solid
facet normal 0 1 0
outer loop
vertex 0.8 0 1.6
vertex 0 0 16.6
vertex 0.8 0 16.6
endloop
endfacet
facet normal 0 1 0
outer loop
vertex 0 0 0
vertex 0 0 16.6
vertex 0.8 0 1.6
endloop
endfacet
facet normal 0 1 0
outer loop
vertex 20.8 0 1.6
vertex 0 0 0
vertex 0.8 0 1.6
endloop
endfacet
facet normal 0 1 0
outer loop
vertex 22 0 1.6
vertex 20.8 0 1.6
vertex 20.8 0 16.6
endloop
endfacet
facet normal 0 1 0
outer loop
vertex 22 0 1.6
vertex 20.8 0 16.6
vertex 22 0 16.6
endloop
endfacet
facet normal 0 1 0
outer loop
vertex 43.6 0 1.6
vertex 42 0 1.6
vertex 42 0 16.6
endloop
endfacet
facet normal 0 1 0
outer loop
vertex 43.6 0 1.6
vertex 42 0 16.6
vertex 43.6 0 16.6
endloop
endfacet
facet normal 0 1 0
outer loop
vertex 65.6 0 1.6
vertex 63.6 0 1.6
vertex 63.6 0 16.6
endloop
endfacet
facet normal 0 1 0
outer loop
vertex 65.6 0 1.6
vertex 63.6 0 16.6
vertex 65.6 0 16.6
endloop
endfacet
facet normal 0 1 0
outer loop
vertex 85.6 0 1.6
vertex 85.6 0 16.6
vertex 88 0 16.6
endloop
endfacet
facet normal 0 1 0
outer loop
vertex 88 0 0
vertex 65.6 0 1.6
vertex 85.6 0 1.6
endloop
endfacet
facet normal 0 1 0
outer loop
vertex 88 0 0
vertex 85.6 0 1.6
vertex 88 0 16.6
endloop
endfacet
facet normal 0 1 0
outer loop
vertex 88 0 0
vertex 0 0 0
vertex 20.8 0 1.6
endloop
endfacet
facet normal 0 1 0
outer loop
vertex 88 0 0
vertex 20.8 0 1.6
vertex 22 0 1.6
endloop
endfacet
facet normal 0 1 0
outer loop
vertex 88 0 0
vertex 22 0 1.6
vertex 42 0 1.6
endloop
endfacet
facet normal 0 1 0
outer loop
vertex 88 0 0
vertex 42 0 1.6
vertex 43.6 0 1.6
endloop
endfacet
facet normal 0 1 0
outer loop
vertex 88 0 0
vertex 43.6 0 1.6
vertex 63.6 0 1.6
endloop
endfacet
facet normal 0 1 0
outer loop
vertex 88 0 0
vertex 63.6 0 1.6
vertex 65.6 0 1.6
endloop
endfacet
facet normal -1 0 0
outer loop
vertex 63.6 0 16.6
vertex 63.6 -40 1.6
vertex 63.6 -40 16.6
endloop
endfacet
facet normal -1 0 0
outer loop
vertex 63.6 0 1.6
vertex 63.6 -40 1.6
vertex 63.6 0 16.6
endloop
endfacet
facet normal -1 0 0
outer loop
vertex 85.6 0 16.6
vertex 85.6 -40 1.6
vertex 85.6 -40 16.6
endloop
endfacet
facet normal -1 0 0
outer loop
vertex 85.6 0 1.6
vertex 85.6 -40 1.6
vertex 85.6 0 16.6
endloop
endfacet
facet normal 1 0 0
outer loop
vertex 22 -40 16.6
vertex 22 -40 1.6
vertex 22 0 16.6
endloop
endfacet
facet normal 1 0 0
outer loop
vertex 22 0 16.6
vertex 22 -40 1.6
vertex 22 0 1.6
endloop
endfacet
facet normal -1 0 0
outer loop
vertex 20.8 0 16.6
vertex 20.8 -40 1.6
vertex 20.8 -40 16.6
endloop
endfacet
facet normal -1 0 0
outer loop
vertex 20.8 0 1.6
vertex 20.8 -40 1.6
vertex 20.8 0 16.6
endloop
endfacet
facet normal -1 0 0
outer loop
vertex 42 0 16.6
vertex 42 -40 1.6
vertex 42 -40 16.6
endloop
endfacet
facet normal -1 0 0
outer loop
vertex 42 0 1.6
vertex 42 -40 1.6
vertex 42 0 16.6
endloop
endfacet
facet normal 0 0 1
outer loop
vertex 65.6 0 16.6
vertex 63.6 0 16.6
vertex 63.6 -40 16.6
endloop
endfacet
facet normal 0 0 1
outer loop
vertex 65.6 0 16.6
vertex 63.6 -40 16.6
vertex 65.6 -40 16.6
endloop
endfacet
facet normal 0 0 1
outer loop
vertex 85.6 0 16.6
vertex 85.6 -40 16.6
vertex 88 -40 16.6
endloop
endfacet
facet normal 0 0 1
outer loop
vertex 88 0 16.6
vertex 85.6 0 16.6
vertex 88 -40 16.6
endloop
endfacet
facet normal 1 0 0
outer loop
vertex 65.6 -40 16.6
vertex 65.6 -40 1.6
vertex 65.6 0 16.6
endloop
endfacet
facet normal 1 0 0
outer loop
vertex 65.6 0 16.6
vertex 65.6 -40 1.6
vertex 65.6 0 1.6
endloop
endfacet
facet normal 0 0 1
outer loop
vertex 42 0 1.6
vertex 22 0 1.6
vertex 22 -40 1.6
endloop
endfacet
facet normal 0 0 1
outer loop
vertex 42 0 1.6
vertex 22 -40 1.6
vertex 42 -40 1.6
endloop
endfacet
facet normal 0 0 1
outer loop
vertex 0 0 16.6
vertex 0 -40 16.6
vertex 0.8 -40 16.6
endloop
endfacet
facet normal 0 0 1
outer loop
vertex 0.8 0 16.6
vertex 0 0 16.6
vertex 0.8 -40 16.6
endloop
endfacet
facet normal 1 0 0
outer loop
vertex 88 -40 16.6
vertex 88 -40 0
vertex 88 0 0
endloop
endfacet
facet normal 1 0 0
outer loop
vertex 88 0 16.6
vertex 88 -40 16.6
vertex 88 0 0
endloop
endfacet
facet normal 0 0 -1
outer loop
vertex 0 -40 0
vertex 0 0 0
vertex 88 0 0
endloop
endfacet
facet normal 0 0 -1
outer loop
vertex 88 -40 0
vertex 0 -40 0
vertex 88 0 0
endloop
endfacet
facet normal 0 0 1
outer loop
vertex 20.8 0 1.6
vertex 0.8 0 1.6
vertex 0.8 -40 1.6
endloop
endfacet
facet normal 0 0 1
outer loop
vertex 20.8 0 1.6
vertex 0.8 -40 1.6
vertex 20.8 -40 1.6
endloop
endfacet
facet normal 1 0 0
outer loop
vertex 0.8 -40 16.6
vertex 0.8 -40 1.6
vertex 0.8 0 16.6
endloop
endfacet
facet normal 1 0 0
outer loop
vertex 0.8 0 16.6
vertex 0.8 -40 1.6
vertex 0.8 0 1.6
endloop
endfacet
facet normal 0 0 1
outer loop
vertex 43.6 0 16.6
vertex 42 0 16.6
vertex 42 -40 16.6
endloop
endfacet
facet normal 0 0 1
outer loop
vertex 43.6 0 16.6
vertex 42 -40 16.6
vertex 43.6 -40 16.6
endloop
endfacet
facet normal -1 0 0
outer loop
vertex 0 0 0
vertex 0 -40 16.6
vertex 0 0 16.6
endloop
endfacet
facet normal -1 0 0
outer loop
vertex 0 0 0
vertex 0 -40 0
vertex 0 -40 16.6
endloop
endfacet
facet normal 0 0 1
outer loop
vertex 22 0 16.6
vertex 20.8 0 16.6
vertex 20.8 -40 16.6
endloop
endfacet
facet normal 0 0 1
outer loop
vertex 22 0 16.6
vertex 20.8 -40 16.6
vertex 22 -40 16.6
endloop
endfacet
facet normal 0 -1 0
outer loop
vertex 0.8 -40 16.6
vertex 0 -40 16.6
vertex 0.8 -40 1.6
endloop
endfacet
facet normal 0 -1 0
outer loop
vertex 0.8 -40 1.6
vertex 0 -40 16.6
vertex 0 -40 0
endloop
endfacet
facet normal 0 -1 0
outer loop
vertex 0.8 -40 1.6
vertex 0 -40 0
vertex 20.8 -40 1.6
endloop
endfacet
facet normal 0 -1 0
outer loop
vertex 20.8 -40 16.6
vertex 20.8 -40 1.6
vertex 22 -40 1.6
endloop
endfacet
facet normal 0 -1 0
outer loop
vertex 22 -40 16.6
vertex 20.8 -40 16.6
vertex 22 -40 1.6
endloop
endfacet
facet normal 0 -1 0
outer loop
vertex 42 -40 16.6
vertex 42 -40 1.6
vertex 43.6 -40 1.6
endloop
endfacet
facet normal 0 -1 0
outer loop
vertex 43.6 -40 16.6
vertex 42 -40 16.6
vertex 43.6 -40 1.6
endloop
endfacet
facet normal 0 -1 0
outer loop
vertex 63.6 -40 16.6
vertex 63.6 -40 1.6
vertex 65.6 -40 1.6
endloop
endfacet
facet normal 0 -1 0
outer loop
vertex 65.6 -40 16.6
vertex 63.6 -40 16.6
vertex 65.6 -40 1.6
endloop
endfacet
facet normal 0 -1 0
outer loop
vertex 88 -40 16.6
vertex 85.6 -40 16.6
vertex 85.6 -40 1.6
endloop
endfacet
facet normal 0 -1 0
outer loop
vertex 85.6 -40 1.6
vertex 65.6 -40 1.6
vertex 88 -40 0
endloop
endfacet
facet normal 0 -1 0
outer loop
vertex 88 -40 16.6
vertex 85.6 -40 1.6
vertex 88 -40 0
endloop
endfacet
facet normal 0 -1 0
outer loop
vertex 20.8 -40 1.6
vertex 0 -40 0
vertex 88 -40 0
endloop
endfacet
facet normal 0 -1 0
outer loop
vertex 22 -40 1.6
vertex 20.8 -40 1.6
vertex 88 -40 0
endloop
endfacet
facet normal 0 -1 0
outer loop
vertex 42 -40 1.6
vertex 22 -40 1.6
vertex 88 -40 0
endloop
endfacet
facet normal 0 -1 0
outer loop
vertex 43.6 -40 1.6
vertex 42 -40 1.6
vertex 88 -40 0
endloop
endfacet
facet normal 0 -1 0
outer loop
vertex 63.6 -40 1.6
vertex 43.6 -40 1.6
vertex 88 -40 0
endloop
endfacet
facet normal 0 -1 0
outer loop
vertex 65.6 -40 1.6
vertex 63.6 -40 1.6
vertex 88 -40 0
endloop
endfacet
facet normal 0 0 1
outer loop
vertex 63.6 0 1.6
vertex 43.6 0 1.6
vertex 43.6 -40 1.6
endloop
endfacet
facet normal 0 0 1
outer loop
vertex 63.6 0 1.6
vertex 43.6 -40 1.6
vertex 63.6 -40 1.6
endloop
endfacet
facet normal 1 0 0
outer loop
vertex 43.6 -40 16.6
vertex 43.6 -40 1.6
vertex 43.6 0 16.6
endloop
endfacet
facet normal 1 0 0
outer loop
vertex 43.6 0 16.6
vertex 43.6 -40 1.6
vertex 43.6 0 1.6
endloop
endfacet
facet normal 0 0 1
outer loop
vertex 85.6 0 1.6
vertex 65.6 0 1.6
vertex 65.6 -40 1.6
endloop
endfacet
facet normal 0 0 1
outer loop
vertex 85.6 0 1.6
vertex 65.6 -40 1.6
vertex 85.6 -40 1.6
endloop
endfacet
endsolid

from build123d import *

# Parameters (mm, degrees)
F0_W     = 88
F0_H     = 40
F1_DEPTH = 1.6
F2_W     = 0.8
F2_H     = 40
F2_W_2   = 1.2
F2_W_3   = 1.6
F2_W_4   = 2
F2_W_5   = 2.4
F3_DEPTH = 15


with BuildPart() as f1:
    # F0 (on Top) → F1 (new body)
    with BuildSketch(Plane.XY):
        with Locations((44, -20)):
            Rectangle(F0_W, F0_H)
    extrude(amount=F1_DEPTH)

    # F2 (on face) → F3 (join)
    with BuildSketch(Plane.XY.offset(1.6)):
        with Locations((0.4, -20)):
            Rectangle(F2_W, F2_H)
        with Locations((21.4, -20)):
            Rectangle(F2_W_2, F2_H)
        with Locations((42.8, -20)):
            Rectangle(F2_W_3, F2_H)
        with Locations((64.6, -20)):
            Rectangle(F2_W_4, F2_H)
        with Locations((86.8, -20)):
            Rectangle(F2_W_5, F2_H)
    extrude(amount=F3_DEPTH)


solid = f1.part
